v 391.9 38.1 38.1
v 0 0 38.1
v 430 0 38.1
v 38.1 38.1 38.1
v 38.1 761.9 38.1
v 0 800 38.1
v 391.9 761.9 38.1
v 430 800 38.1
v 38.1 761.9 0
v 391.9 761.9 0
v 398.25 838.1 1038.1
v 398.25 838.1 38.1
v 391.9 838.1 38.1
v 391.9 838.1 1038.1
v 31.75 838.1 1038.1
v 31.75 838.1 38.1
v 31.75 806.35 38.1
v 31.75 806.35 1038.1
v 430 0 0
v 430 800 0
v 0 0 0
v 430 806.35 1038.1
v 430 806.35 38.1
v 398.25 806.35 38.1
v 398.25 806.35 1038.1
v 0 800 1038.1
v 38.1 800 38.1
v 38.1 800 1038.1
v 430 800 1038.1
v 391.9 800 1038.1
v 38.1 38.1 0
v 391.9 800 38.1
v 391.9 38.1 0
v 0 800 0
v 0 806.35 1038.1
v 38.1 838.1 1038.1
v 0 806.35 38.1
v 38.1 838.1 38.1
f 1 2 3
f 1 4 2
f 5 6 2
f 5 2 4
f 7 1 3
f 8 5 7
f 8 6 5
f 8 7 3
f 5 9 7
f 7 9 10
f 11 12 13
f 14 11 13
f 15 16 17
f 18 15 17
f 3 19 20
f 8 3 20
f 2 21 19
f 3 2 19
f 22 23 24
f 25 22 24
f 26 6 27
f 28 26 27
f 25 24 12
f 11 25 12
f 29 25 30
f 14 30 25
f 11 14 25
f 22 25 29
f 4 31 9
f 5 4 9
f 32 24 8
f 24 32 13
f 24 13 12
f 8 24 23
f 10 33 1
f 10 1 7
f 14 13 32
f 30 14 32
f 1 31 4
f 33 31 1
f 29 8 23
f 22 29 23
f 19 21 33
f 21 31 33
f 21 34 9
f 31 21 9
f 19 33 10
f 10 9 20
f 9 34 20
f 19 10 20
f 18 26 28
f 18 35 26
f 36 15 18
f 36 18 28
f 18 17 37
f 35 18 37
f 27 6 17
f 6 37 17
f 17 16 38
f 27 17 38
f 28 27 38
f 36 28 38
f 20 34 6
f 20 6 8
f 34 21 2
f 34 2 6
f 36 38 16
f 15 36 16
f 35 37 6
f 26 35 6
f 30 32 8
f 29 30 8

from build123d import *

# Parameters (mm, degrees)
CROQUIS1_W                = 430
CROQUIS1_H                = 800
CROQUIS1_W_2              = 353.8
CROQUIS1_H_2              = 723.8
SALIENTE_EXTRUIR1_DEPTH   = 38.1
SALIENTE_EXTRUIR2_DEPTH   = 1000
SALIENTE_EXTRUIR2_2_DEPTH = 1000


with BuildPart() as part:
    # Croquis1 → Saliente-Extruir1 (new body)
    with BuildSketch(Plane.XY):
        with Locations((215, 400)):
            Rectangle(CROQUIS1_W, CROQUIS1_H)
        with Locations((215, 400)):
            Rectangle(CROQUIS1_W_2, CROQUIS1_H_2, mode=Mode.SUBTRACT)
    extrude(amount=SALIENTE_EXTRUIR1_DEPTH)


with BuildPart() as body_2:
    # Croquis3 → Saliente-Extruir2 (new body)
    with BuildSketch(Plane.XY.offset(38.1)):
        Polygon((0, 800), (38.1, 800), (38.1, 838.1), (31.75, 838.1), (31.75, 806.35), (0, 806.35), align=None)
    extrude(amount=SALIENTE_EXTRUIR2_DEPTH)


with BuildPart() as body_3:
    # Croquis3 → Saliente-Extruir2 2 (new body)
    with BuildSketch(Plane.XY.offset(38.1)):
        Polygon((398.25, 838.1), (391.9, 838.1), (391.9, 800), (430, 800), (430, 806.35), (398.25, 806.35), align=None)
    extrude(amount=SALIENTE_EXTRUIR2_2_DEPTH)


solid = Compound([part.part, body_2.part, body_3.part])
